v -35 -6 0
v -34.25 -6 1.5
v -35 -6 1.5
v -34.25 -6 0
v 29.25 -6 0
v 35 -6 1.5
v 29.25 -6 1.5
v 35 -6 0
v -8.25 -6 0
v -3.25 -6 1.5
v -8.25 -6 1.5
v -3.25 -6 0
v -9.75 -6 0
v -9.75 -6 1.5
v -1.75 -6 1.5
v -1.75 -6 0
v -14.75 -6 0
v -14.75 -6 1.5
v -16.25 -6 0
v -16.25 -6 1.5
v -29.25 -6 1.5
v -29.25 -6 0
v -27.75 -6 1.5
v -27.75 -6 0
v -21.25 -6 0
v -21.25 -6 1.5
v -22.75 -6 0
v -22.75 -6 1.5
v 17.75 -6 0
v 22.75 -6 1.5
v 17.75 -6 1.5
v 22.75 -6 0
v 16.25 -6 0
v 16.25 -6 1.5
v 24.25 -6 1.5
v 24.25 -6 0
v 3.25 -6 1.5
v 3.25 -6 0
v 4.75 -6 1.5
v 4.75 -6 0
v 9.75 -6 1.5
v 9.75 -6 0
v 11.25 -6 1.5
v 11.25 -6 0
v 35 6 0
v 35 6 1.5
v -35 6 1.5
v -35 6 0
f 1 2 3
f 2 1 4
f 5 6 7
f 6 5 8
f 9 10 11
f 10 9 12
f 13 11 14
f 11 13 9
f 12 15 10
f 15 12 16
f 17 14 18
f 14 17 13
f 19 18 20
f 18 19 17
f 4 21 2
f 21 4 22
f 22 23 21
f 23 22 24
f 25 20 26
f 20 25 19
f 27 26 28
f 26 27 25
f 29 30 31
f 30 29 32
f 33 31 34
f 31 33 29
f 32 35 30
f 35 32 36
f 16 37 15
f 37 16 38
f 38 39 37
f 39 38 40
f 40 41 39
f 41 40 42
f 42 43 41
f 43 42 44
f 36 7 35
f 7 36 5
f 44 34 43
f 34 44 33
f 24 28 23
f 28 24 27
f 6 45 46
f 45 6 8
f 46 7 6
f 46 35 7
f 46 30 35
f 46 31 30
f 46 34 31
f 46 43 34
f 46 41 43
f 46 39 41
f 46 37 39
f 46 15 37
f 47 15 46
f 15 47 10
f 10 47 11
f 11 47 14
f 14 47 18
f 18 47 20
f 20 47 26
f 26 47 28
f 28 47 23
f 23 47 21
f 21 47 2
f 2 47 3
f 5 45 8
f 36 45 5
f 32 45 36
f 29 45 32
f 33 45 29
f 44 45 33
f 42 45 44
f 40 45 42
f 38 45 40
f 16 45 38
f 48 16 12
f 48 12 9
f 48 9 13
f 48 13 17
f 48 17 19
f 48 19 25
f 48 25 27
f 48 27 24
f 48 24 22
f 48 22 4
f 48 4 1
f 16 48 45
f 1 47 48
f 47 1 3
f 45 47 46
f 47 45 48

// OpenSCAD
// 10-well agarose gel comb - flat plate with spine and hanging teeth.
// Orientation: Lying flat on XY plane (Z=0), spine along X, teeth hanging in -Y.

// Dimensions
spine_len = 70;   // Length of the spine (X)
spine_w   = 12;   // Width of the spine (Y)
plate_thk = 1.5;  // Thickness of the plate (Z)

tooth_w   = 5.0;  // Width of each tooth (X)
tooth_l   = 12;   // Length of each tooth (Y)
gap       = 1.5;  // Gap between teeth (X)
n_teeth   = 10;   // Number of teeth

// Calculated positions
// Total width of teeth row = n_teeth * tooth_w + (n_teeth - 1) * gap
tooth_row_w = n_teeth * tooth_w + (n_teeth - 1) * gap;

// Spine is 12mm wide, tooth row is wider. We need to center the tooth row on the spine.
// The spine extends from -spine_w/2 to +spine_w/2 in Y.
// The tooth row extends from -(tooth_row_w/2) to +(tooth_row_w/2) in Y.
// Offset to center the tooth row on the spine:
y_offset = (spine_w - tooth_row_w) / 2;

// X positions for the teeth, centered on the spine (origin)
// Positions: -(total_width/2) + i * (tooth_w + gap)
x_step = tooth_w + gap;
x_start = -tooth_row_w / 2;

$fn = 64;

// Main body: Spine + Plate
// We build the spine as a block, then subtract the gaps to create the teeth wells.
// Alternatively, build the full block and subtract the tooth volumes.

difference() {
    // 1. The main block (Spine + Plate)
    // Spine is at Z=0 to Z=plate_thk.
    // Spine X: -spine_len/2 to +spine_len/2
    // Spine Y: -spine_w/2 to +spine_w/2
    translate([-spine_len / 2, -spine_w / 2, 0]) 
        cube([spine_len, spine_w, plate_thk]);

    // 2. The teeth (holes to be cut)
    // Each tooth hangs down in -Y direction from the spine.
    // Tooth geometry:
    // X: tooth_w wide
    // Y: tooth_l long (hanging from spine edge)
    // Z: plate_thk deep
    
    // We cut the teeth out of the main block.
    // The spine edge is at Y = -spine_w/2.
    // The teeth hang from Y = -spine_w/2 down to Y = -spine_w/2 - tooth_l.
    
    for (i = [0 : n_teeth - 1]) {
        // Calculate X position for this tooth
        x_pos = x_start + i * x_step;
        
        // Calculate Y position for this tooth
        // Starts at the bottom edge of the spine (-spine_w/2)
        // Extends in -Y direction by tooth_l
        y_start = -spine_w / 2;
        y_end = y_start - tooth_l;
        
        // Define the tooth volume to cut
        // X range: [x_pos - tooth_w/2, x_pos + tooth_w/2]
        // Y range: [y_end, y_start] (since we are cutting, order doesn't matter for bounds, but logic is clear)
        // Z range: [0, plate_thk]
        
        translate([x_pos - tooth_w / 2, y_end, 0])
            cube([tooth_w, tooth_l, plate_thk]);
    }
}
